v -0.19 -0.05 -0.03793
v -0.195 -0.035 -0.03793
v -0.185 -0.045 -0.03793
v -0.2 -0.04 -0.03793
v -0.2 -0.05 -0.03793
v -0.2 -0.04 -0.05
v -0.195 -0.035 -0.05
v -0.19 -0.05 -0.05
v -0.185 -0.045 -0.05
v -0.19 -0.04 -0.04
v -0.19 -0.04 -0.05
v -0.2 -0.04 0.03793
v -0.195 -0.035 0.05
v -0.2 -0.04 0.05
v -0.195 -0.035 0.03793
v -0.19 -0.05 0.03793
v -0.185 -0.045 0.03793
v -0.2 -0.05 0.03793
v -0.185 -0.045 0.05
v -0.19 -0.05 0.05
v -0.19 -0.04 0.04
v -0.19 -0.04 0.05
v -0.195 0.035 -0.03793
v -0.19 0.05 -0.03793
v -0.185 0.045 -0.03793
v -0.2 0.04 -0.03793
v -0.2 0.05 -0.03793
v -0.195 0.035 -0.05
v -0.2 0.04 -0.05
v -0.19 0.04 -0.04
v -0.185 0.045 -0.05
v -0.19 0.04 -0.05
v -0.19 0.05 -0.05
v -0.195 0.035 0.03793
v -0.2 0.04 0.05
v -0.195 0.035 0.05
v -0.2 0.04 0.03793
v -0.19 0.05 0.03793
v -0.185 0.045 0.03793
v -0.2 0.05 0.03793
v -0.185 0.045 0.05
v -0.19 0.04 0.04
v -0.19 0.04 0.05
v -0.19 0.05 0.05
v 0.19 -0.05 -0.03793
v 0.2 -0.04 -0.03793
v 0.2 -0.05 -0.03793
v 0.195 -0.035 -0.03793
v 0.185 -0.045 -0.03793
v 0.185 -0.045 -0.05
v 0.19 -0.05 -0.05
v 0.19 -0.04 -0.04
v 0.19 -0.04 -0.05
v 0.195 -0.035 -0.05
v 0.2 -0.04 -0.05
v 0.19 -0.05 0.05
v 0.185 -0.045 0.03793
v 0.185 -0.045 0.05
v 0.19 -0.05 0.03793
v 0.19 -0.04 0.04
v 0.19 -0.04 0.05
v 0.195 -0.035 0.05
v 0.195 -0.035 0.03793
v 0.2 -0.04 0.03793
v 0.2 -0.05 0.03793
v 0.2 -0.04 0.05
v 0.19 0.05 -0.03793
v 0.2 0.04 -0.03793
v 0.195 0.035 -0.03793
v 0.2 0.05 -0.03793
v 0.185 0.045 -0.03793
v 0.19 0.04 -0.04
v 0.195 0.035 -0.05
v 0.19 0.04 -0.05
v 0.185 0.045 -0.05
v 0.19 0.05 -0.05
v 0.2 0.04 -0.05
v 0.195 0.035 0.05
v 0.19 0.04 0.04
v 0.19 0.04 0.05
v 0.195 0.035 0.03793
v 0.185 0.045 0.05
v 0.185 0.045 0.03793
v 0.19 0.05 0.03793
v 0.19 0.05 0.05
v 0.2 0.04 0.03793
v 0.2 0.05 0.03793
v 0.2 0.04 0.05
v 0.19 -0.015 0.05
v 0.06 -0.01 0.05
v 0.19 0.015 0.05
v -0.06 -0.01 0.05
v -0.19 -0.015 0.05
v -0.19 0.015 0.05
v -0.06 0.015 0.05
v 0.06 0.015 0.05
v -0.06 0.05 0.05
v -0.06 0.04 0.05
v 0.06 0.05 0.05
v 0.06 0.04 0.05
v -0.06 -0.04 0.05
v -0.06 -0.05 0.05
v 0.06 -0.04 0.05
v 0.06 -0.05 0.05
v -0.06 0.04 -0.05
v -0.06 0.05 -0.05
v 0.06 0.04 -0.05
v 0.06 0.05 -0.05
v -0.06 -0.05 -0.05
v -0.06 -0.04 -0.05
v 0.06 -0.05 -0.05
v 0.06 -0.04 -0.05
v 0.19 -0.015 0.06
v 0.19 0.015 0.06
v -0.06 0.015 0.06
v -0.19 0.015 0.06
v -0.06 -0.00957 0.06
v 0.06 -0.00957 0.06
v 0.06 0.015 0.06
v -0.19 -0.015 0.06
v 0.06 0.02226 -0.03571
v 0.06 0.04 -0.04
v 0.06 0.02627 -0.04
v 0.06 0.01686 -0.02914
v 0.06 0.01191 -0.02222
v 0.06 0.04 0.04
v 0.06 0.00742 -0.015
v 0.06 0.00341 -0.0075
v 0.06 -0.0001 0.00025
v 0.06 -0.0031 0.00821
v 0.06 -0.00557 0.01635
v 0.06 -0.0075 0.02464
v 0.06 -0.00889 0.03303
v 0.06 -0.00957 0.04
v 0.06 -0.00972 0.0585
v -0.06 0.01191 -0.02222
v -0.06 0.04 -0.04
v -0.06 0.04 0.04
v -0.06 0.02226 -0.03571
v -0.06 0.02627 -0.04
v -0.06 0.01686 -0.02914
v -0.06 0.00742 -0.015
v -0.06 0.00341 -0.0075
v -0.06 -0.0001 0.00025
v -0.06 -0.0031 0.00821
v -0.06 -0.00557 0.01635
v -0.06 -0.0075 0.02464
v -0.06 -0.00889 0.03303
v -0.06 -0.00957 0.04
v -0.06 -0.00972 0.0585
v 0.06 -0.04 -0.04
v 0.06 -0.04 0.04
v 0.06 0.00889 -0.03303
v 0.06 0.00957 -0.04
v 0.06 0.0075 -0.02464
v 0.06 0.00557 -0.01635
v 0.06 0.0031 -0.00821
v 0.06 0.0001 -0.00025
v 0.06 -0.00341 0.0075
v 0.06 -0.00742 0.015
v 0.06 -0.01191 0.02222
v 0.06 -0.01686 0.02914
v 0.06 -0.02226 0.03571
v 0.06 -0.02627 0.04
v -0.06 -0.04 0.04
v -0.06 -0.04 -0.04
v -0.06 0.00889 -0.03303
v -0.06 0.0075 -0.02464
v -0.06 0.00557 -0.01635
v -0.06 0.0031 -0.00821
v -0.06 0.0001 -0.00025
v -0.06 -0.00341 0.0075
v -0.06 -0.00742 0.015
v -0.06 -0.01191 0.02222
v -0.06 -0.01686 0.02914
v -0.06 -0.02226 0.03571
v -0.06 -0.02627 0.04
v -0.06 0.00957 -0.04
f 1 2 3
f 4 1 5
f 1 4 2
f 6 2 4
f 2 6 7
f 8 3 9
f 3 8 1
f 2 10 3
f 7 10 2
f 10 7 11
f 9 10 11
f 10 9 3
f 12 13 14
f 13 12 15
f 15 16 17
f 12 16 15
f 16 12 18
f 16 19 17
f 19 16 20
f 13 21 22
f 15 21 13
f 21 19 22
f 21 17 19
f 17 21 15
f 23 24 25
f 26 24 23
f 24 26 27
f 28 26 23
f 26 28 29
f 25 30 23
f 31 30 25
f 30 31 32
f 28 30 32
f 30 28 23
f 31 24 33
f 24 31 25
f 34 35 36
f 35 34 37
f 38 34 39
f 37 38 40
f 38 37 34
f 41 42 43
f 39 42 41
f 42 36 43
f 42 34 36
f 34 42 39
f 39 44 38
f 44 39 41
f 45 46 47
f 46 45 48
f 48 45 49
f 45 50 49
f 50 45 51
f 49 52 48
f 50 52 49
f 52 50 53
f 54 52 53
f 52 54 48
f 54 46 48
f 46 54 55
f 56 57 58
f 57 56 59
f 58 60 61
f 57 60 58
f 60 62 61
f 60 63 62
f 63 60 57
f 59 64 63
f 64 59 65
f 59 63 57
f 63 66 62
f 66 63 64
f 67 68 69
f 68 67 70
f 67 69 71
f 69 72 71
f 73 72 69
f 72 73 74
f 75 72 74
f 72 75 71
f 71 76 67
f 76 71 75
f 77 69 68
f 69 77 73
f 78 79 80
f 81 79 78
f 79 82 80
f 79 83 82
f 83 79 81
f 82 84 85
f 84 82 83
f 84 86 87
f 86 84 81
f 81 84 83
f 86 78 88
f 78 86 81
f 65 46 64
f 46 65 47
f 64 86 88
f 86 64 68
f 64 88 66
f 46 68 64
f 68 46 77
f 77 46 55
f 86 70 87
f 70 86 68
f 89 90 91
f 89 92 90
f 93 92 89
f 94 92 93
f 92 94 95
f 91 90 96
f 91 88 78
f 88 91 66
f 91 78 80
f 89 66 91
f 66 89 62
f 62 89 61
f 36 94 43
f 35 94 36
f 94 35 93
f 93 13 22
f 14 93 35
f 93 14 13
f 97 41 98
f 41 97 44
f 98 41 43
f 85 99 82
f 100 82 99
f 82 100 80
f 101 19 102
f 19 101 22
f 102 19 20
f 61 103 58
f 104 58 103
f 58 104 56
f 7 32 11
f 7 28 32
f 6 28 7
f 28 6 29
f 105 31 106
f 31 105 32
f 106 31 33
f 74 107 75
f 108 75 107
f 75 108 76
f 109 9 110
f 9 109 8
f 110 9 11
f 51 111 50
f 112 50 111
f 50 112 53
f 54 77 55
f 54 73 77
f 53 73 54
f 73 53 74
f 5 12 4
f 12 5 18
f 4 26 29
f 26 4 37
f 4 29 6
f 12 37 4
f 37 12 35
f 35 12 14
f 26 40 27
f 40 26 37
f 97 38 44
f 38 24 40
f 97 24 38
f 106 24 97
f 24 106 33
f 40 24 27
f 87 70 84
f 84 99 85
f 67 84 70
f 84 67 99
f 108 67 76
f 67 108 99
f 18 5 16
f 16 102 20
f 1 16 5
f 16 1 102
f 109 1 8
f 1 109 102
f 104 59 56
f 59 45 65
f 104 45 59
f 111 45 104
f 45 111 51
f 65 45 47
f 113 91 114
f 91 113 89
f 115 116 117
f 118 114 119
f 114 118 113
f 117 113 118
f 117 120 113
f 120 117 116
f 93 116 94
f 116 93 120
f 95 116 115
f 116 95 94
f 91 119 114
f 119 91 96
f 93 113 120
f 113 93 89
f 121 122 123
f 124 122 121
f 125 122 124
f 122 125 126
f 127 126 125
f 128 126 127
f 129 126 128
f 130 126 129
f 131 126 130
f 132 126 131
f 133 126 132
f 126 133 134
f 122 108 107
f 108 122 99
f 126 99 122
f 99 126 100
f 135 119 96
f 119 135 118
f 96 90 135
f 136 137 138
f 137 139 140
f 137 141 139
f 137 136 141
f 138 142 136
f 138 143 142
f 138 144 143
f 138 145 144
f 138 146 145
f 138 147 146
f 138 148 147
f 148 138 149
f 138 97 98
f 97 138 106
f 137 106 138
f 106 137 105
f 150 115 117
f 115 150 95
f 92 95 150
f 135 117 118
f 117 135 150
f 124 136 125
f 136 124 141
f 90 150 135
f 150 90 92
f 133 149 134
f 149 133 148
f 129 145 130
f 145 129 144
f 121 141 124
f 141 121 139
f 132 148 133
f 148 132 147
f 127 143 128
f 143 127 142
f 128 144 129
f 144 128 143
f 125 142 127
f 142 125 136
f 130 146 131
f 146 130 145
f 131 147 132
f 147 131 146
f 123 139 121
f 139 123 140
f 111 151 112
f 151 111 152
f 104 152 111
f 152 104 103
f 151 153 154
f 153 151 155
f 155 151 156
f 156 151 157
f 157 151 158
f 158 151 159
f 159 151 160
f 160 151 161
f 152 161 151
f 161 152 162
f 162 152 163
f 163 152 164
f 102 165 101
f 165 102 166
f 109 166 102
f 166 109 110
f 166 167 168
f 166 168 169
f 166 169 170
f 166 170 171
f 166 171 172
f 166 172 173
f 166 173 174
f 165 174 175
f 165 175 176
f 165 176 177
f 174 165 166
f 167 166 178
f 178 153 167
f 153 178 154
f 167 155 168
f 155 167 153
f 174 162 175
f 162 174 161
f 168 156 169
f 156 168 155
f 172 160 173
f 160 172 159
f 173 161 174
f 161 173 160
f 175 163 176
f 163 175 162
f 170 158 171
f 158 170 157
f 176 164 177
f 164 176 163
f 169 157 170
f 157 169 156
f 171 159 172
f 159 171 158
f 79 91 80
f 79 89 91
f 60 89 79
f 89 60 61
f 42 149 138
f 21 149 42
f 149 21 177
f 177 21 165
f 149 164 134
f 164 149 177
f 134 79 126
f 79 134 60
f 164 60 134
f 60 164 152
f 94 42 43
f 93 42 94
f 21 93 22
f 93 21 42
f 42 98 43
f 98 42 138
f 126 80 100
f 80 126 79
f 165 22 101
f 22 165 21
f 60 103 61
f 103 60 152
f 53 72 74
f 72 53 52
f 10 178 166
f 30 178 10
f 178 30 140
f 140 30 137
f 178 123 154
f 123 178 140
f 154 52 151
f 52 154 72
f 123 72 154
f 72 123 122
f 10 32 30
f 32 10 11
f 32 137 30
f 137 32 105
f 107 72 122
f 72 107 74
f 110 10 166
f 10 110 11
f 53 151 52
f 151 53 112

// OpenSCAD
$fn=96;

L = 0.4;
W = 0.1;
H = 0.1;

ch = 0.01;          // chamfer size
panel_inset = 0.01; // inset from perimeter for recessed panel
panel_depth = 0.01; // depth of recess on broad faces

rib_w = 0.03;       // central rib width across W
rib_h = 0.01;       // rib height above arched top surface

arch_sag = 0.01;    // concave sag across width on top/bottom
arch_len = 0.12;    // length of arched region along X (centered)

module chamfered_block(l, w, h, c){
    difference(){
        cube([l,w,h], center=true);
        for (sx=[-1,1], sy=[-1,1], sz=[-1,1]){
            translate([sx*(l/2 - c/2), sy*(w/2 - c/2), sz*(h/2 - c/2)])
                rotate([0,0,45])
                    cube([c*sqrt(2), c*sqrt(2), c*sqrt(2)], center=true);
        }
    }
}

module recessed_panel_on_face(zsign=1){
    translate([0,0,zsign*(H/2 - panel_depth/2)])
        cube([L - 2*panel_inset, W - 2*panel_inset, panel_depth], center=true);
}

module arch_cut(zsign=1){
    // Creates a shallow concave curvature across width by subtracting a large cylinder
    // oriented along X, limited to a central length region.
    r = (W*W)/(8*arch_sag) + arch_sag/2;
    y0 = zsign*(r - arch_sag);
    intersection(){
        translate([0,0,0])
            cube([arch_len, W+0.2, H+0.2], center=true);
        translate([0, y0, 0])
            rotate([0,90,0])
                cylinder(r=r, h=arch_len+0.4, center=true);
    }
}

module central_rib(){
    translate([0,0,H/2 + rib_h/2])
        cube([L - 2*panel_inset, rib_w, rib_h], center=true);
}

difference(){
    union(){
        chamfered_block(L,W,H,ch);
        central_rib();
    }
    recessed_panel_on_face(1);
    recessed_panel_on_face(-1);
    translate([0,0,H/2]) arch_cut(1);
    translate([0,0,-H/2]) arch_cut(-1);
}
